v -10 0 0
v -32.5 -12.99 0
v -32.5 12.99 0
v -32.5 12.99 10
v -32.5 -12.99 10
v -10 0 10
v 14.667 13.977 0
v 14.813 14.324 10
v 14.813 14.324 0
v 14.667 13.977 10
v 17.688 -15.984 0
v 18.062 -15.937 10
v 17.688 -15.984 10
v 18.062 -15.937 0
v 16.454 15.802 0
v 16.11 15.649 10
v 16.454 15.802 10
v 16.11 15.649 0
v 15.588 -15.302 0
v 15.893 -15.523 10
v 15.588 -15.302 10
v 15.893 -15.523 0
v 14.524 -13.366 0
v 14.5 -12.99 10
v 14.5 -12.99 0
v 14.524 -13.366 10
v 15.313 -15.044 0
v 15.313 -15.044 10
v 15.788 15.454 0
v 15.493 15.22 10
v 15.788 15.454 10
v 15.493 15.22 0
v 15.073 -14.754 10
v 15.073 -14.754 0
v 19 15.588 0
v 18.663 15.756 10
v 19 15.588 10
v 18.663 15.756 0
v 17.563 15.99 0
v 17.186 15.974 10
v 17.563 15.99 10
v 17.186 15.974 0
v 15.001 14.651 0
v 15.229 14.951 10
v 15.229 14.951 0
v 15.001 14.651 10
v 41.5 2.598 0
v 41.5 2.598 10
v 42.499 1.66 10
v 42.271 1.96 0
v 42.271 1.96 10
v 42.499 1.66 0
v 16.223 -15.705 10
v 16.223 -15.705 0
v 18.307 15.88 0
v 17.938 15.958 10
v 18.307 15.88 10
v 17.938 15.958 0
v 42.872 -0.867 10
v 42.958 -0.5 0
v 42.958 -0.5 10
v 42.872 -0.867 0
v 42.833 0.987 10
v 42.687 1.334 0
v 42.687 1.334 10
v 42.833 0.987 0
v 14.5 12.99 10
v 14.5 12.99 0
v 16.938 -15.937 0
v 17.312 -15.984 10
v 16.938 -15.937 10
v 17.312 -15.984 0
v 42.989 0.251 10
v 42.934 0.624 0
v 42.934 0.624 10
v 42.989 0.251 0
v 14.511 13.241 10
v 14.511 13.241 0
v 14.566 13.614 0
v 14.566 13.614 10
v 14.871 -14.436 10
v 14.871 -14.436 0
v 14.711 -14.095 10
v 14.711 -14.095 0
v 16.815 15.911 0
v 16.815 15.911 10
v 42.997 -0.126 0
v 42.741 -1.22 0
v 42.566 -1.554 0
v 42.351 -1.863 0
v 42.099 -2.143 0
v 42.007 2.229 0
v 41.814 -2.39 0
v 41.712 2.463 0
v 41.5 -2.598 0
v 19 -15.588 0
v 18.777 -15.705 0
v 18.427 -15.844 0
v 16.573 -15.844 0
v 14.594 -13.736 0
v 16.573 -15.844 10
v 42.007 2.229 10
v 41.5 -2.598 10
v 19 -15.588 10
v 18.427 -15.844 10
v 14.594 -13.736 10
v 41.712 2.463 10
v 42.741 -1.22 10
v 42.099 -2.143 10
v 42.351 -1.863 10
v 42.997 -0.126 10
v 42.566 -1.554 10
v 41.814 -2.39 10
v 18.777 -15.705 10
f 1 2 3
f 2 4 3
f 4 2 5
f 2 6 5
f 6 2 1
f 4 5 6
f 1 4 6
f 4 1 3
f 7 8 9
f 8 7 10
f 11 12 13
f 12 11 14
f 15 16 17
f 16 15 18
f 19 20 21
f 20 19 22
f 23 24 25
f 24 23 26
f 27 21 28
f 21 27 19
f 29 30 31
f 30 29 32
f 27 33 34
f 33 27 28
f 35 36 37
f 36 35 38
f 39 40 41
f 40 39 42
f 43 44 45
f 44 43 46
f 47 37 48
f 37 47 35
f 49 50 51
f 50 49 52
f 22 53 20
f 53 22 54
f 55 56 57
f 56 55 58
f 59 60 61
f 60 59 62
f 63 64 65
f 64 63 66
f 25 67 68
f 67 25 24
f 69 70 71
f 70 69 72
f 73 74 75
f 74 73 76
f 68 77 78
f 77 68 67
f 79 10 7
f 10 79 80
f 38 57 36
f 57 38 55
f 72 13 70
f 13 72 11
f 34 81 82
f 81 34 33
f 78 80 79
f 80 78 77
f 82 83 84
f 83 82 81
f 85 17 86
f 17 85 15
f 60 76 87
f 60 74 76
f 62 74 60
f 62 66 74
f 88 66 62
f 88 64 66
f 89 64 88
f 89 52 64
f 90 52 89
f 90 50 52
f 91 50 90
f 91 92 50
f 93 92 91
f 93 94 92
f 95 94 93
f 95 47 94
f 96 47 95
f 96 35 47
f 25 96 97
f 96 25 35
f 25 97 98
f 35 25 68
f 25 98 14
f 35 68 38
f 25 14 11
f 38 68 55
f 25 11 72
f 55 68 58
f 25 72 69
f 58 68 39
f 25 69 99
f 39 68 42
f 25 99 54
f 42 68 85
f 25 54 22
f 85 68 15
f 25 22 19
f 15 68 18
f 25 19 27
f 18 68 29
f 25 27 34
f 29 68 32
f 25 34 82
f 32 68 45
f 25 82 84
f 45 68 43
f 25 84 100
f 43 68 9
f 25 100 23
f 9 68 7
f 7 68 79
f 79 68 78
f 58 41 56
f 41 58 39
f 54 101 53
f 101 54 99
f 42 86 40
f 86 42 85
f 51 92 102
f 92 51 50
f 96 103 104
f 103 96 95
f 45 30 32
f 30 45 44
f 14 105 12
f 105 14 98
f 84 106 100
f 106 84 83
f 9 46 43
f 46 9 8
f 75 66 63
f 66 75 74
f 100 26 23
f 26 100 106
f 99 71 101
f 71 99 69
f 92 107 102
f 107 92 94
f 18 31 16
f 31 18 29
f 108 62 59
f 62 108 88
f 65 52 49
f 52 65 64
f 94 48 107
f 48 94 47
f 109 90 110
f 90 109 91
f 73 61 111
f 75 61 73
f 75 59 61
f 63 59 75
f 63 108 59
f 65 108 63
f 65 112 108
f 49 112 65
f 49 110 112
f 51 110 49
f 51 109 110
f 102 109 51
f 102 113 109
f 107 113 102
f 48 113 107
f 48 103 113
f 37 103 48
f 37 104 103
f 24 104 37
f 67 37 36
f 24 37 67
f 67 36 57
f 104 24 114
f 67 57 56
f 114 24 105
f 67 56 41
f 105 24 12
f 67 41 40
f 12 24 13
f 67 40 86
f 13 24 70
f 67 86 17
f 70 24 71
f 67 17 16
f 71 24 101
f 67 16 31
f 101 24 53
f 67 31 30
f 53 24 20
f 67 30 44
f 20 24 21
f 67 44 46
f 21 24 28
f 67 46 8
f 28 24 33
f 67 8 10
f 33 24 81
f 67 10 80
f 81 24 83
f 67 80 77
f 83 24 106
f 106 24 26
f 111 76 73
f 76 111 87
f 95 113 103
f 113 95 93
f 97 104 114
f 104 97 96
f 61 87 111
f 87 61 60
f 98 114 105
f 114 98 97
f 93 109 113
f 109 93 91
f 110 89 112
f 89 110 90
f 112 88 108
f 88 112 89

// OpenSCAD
union() {
  translate([-25, 0, 0]) {
    linear_extrude(height = 10) {
      circle(r = 15, $fn = 3);
    }
  }
  translate([25, 0, 0]) {
    linear_extrude(height = 10) {
      offset(r = 3) {
        circle(r = 15, $fn = 3);
      }
    }
  }
}
$fn = 50;
